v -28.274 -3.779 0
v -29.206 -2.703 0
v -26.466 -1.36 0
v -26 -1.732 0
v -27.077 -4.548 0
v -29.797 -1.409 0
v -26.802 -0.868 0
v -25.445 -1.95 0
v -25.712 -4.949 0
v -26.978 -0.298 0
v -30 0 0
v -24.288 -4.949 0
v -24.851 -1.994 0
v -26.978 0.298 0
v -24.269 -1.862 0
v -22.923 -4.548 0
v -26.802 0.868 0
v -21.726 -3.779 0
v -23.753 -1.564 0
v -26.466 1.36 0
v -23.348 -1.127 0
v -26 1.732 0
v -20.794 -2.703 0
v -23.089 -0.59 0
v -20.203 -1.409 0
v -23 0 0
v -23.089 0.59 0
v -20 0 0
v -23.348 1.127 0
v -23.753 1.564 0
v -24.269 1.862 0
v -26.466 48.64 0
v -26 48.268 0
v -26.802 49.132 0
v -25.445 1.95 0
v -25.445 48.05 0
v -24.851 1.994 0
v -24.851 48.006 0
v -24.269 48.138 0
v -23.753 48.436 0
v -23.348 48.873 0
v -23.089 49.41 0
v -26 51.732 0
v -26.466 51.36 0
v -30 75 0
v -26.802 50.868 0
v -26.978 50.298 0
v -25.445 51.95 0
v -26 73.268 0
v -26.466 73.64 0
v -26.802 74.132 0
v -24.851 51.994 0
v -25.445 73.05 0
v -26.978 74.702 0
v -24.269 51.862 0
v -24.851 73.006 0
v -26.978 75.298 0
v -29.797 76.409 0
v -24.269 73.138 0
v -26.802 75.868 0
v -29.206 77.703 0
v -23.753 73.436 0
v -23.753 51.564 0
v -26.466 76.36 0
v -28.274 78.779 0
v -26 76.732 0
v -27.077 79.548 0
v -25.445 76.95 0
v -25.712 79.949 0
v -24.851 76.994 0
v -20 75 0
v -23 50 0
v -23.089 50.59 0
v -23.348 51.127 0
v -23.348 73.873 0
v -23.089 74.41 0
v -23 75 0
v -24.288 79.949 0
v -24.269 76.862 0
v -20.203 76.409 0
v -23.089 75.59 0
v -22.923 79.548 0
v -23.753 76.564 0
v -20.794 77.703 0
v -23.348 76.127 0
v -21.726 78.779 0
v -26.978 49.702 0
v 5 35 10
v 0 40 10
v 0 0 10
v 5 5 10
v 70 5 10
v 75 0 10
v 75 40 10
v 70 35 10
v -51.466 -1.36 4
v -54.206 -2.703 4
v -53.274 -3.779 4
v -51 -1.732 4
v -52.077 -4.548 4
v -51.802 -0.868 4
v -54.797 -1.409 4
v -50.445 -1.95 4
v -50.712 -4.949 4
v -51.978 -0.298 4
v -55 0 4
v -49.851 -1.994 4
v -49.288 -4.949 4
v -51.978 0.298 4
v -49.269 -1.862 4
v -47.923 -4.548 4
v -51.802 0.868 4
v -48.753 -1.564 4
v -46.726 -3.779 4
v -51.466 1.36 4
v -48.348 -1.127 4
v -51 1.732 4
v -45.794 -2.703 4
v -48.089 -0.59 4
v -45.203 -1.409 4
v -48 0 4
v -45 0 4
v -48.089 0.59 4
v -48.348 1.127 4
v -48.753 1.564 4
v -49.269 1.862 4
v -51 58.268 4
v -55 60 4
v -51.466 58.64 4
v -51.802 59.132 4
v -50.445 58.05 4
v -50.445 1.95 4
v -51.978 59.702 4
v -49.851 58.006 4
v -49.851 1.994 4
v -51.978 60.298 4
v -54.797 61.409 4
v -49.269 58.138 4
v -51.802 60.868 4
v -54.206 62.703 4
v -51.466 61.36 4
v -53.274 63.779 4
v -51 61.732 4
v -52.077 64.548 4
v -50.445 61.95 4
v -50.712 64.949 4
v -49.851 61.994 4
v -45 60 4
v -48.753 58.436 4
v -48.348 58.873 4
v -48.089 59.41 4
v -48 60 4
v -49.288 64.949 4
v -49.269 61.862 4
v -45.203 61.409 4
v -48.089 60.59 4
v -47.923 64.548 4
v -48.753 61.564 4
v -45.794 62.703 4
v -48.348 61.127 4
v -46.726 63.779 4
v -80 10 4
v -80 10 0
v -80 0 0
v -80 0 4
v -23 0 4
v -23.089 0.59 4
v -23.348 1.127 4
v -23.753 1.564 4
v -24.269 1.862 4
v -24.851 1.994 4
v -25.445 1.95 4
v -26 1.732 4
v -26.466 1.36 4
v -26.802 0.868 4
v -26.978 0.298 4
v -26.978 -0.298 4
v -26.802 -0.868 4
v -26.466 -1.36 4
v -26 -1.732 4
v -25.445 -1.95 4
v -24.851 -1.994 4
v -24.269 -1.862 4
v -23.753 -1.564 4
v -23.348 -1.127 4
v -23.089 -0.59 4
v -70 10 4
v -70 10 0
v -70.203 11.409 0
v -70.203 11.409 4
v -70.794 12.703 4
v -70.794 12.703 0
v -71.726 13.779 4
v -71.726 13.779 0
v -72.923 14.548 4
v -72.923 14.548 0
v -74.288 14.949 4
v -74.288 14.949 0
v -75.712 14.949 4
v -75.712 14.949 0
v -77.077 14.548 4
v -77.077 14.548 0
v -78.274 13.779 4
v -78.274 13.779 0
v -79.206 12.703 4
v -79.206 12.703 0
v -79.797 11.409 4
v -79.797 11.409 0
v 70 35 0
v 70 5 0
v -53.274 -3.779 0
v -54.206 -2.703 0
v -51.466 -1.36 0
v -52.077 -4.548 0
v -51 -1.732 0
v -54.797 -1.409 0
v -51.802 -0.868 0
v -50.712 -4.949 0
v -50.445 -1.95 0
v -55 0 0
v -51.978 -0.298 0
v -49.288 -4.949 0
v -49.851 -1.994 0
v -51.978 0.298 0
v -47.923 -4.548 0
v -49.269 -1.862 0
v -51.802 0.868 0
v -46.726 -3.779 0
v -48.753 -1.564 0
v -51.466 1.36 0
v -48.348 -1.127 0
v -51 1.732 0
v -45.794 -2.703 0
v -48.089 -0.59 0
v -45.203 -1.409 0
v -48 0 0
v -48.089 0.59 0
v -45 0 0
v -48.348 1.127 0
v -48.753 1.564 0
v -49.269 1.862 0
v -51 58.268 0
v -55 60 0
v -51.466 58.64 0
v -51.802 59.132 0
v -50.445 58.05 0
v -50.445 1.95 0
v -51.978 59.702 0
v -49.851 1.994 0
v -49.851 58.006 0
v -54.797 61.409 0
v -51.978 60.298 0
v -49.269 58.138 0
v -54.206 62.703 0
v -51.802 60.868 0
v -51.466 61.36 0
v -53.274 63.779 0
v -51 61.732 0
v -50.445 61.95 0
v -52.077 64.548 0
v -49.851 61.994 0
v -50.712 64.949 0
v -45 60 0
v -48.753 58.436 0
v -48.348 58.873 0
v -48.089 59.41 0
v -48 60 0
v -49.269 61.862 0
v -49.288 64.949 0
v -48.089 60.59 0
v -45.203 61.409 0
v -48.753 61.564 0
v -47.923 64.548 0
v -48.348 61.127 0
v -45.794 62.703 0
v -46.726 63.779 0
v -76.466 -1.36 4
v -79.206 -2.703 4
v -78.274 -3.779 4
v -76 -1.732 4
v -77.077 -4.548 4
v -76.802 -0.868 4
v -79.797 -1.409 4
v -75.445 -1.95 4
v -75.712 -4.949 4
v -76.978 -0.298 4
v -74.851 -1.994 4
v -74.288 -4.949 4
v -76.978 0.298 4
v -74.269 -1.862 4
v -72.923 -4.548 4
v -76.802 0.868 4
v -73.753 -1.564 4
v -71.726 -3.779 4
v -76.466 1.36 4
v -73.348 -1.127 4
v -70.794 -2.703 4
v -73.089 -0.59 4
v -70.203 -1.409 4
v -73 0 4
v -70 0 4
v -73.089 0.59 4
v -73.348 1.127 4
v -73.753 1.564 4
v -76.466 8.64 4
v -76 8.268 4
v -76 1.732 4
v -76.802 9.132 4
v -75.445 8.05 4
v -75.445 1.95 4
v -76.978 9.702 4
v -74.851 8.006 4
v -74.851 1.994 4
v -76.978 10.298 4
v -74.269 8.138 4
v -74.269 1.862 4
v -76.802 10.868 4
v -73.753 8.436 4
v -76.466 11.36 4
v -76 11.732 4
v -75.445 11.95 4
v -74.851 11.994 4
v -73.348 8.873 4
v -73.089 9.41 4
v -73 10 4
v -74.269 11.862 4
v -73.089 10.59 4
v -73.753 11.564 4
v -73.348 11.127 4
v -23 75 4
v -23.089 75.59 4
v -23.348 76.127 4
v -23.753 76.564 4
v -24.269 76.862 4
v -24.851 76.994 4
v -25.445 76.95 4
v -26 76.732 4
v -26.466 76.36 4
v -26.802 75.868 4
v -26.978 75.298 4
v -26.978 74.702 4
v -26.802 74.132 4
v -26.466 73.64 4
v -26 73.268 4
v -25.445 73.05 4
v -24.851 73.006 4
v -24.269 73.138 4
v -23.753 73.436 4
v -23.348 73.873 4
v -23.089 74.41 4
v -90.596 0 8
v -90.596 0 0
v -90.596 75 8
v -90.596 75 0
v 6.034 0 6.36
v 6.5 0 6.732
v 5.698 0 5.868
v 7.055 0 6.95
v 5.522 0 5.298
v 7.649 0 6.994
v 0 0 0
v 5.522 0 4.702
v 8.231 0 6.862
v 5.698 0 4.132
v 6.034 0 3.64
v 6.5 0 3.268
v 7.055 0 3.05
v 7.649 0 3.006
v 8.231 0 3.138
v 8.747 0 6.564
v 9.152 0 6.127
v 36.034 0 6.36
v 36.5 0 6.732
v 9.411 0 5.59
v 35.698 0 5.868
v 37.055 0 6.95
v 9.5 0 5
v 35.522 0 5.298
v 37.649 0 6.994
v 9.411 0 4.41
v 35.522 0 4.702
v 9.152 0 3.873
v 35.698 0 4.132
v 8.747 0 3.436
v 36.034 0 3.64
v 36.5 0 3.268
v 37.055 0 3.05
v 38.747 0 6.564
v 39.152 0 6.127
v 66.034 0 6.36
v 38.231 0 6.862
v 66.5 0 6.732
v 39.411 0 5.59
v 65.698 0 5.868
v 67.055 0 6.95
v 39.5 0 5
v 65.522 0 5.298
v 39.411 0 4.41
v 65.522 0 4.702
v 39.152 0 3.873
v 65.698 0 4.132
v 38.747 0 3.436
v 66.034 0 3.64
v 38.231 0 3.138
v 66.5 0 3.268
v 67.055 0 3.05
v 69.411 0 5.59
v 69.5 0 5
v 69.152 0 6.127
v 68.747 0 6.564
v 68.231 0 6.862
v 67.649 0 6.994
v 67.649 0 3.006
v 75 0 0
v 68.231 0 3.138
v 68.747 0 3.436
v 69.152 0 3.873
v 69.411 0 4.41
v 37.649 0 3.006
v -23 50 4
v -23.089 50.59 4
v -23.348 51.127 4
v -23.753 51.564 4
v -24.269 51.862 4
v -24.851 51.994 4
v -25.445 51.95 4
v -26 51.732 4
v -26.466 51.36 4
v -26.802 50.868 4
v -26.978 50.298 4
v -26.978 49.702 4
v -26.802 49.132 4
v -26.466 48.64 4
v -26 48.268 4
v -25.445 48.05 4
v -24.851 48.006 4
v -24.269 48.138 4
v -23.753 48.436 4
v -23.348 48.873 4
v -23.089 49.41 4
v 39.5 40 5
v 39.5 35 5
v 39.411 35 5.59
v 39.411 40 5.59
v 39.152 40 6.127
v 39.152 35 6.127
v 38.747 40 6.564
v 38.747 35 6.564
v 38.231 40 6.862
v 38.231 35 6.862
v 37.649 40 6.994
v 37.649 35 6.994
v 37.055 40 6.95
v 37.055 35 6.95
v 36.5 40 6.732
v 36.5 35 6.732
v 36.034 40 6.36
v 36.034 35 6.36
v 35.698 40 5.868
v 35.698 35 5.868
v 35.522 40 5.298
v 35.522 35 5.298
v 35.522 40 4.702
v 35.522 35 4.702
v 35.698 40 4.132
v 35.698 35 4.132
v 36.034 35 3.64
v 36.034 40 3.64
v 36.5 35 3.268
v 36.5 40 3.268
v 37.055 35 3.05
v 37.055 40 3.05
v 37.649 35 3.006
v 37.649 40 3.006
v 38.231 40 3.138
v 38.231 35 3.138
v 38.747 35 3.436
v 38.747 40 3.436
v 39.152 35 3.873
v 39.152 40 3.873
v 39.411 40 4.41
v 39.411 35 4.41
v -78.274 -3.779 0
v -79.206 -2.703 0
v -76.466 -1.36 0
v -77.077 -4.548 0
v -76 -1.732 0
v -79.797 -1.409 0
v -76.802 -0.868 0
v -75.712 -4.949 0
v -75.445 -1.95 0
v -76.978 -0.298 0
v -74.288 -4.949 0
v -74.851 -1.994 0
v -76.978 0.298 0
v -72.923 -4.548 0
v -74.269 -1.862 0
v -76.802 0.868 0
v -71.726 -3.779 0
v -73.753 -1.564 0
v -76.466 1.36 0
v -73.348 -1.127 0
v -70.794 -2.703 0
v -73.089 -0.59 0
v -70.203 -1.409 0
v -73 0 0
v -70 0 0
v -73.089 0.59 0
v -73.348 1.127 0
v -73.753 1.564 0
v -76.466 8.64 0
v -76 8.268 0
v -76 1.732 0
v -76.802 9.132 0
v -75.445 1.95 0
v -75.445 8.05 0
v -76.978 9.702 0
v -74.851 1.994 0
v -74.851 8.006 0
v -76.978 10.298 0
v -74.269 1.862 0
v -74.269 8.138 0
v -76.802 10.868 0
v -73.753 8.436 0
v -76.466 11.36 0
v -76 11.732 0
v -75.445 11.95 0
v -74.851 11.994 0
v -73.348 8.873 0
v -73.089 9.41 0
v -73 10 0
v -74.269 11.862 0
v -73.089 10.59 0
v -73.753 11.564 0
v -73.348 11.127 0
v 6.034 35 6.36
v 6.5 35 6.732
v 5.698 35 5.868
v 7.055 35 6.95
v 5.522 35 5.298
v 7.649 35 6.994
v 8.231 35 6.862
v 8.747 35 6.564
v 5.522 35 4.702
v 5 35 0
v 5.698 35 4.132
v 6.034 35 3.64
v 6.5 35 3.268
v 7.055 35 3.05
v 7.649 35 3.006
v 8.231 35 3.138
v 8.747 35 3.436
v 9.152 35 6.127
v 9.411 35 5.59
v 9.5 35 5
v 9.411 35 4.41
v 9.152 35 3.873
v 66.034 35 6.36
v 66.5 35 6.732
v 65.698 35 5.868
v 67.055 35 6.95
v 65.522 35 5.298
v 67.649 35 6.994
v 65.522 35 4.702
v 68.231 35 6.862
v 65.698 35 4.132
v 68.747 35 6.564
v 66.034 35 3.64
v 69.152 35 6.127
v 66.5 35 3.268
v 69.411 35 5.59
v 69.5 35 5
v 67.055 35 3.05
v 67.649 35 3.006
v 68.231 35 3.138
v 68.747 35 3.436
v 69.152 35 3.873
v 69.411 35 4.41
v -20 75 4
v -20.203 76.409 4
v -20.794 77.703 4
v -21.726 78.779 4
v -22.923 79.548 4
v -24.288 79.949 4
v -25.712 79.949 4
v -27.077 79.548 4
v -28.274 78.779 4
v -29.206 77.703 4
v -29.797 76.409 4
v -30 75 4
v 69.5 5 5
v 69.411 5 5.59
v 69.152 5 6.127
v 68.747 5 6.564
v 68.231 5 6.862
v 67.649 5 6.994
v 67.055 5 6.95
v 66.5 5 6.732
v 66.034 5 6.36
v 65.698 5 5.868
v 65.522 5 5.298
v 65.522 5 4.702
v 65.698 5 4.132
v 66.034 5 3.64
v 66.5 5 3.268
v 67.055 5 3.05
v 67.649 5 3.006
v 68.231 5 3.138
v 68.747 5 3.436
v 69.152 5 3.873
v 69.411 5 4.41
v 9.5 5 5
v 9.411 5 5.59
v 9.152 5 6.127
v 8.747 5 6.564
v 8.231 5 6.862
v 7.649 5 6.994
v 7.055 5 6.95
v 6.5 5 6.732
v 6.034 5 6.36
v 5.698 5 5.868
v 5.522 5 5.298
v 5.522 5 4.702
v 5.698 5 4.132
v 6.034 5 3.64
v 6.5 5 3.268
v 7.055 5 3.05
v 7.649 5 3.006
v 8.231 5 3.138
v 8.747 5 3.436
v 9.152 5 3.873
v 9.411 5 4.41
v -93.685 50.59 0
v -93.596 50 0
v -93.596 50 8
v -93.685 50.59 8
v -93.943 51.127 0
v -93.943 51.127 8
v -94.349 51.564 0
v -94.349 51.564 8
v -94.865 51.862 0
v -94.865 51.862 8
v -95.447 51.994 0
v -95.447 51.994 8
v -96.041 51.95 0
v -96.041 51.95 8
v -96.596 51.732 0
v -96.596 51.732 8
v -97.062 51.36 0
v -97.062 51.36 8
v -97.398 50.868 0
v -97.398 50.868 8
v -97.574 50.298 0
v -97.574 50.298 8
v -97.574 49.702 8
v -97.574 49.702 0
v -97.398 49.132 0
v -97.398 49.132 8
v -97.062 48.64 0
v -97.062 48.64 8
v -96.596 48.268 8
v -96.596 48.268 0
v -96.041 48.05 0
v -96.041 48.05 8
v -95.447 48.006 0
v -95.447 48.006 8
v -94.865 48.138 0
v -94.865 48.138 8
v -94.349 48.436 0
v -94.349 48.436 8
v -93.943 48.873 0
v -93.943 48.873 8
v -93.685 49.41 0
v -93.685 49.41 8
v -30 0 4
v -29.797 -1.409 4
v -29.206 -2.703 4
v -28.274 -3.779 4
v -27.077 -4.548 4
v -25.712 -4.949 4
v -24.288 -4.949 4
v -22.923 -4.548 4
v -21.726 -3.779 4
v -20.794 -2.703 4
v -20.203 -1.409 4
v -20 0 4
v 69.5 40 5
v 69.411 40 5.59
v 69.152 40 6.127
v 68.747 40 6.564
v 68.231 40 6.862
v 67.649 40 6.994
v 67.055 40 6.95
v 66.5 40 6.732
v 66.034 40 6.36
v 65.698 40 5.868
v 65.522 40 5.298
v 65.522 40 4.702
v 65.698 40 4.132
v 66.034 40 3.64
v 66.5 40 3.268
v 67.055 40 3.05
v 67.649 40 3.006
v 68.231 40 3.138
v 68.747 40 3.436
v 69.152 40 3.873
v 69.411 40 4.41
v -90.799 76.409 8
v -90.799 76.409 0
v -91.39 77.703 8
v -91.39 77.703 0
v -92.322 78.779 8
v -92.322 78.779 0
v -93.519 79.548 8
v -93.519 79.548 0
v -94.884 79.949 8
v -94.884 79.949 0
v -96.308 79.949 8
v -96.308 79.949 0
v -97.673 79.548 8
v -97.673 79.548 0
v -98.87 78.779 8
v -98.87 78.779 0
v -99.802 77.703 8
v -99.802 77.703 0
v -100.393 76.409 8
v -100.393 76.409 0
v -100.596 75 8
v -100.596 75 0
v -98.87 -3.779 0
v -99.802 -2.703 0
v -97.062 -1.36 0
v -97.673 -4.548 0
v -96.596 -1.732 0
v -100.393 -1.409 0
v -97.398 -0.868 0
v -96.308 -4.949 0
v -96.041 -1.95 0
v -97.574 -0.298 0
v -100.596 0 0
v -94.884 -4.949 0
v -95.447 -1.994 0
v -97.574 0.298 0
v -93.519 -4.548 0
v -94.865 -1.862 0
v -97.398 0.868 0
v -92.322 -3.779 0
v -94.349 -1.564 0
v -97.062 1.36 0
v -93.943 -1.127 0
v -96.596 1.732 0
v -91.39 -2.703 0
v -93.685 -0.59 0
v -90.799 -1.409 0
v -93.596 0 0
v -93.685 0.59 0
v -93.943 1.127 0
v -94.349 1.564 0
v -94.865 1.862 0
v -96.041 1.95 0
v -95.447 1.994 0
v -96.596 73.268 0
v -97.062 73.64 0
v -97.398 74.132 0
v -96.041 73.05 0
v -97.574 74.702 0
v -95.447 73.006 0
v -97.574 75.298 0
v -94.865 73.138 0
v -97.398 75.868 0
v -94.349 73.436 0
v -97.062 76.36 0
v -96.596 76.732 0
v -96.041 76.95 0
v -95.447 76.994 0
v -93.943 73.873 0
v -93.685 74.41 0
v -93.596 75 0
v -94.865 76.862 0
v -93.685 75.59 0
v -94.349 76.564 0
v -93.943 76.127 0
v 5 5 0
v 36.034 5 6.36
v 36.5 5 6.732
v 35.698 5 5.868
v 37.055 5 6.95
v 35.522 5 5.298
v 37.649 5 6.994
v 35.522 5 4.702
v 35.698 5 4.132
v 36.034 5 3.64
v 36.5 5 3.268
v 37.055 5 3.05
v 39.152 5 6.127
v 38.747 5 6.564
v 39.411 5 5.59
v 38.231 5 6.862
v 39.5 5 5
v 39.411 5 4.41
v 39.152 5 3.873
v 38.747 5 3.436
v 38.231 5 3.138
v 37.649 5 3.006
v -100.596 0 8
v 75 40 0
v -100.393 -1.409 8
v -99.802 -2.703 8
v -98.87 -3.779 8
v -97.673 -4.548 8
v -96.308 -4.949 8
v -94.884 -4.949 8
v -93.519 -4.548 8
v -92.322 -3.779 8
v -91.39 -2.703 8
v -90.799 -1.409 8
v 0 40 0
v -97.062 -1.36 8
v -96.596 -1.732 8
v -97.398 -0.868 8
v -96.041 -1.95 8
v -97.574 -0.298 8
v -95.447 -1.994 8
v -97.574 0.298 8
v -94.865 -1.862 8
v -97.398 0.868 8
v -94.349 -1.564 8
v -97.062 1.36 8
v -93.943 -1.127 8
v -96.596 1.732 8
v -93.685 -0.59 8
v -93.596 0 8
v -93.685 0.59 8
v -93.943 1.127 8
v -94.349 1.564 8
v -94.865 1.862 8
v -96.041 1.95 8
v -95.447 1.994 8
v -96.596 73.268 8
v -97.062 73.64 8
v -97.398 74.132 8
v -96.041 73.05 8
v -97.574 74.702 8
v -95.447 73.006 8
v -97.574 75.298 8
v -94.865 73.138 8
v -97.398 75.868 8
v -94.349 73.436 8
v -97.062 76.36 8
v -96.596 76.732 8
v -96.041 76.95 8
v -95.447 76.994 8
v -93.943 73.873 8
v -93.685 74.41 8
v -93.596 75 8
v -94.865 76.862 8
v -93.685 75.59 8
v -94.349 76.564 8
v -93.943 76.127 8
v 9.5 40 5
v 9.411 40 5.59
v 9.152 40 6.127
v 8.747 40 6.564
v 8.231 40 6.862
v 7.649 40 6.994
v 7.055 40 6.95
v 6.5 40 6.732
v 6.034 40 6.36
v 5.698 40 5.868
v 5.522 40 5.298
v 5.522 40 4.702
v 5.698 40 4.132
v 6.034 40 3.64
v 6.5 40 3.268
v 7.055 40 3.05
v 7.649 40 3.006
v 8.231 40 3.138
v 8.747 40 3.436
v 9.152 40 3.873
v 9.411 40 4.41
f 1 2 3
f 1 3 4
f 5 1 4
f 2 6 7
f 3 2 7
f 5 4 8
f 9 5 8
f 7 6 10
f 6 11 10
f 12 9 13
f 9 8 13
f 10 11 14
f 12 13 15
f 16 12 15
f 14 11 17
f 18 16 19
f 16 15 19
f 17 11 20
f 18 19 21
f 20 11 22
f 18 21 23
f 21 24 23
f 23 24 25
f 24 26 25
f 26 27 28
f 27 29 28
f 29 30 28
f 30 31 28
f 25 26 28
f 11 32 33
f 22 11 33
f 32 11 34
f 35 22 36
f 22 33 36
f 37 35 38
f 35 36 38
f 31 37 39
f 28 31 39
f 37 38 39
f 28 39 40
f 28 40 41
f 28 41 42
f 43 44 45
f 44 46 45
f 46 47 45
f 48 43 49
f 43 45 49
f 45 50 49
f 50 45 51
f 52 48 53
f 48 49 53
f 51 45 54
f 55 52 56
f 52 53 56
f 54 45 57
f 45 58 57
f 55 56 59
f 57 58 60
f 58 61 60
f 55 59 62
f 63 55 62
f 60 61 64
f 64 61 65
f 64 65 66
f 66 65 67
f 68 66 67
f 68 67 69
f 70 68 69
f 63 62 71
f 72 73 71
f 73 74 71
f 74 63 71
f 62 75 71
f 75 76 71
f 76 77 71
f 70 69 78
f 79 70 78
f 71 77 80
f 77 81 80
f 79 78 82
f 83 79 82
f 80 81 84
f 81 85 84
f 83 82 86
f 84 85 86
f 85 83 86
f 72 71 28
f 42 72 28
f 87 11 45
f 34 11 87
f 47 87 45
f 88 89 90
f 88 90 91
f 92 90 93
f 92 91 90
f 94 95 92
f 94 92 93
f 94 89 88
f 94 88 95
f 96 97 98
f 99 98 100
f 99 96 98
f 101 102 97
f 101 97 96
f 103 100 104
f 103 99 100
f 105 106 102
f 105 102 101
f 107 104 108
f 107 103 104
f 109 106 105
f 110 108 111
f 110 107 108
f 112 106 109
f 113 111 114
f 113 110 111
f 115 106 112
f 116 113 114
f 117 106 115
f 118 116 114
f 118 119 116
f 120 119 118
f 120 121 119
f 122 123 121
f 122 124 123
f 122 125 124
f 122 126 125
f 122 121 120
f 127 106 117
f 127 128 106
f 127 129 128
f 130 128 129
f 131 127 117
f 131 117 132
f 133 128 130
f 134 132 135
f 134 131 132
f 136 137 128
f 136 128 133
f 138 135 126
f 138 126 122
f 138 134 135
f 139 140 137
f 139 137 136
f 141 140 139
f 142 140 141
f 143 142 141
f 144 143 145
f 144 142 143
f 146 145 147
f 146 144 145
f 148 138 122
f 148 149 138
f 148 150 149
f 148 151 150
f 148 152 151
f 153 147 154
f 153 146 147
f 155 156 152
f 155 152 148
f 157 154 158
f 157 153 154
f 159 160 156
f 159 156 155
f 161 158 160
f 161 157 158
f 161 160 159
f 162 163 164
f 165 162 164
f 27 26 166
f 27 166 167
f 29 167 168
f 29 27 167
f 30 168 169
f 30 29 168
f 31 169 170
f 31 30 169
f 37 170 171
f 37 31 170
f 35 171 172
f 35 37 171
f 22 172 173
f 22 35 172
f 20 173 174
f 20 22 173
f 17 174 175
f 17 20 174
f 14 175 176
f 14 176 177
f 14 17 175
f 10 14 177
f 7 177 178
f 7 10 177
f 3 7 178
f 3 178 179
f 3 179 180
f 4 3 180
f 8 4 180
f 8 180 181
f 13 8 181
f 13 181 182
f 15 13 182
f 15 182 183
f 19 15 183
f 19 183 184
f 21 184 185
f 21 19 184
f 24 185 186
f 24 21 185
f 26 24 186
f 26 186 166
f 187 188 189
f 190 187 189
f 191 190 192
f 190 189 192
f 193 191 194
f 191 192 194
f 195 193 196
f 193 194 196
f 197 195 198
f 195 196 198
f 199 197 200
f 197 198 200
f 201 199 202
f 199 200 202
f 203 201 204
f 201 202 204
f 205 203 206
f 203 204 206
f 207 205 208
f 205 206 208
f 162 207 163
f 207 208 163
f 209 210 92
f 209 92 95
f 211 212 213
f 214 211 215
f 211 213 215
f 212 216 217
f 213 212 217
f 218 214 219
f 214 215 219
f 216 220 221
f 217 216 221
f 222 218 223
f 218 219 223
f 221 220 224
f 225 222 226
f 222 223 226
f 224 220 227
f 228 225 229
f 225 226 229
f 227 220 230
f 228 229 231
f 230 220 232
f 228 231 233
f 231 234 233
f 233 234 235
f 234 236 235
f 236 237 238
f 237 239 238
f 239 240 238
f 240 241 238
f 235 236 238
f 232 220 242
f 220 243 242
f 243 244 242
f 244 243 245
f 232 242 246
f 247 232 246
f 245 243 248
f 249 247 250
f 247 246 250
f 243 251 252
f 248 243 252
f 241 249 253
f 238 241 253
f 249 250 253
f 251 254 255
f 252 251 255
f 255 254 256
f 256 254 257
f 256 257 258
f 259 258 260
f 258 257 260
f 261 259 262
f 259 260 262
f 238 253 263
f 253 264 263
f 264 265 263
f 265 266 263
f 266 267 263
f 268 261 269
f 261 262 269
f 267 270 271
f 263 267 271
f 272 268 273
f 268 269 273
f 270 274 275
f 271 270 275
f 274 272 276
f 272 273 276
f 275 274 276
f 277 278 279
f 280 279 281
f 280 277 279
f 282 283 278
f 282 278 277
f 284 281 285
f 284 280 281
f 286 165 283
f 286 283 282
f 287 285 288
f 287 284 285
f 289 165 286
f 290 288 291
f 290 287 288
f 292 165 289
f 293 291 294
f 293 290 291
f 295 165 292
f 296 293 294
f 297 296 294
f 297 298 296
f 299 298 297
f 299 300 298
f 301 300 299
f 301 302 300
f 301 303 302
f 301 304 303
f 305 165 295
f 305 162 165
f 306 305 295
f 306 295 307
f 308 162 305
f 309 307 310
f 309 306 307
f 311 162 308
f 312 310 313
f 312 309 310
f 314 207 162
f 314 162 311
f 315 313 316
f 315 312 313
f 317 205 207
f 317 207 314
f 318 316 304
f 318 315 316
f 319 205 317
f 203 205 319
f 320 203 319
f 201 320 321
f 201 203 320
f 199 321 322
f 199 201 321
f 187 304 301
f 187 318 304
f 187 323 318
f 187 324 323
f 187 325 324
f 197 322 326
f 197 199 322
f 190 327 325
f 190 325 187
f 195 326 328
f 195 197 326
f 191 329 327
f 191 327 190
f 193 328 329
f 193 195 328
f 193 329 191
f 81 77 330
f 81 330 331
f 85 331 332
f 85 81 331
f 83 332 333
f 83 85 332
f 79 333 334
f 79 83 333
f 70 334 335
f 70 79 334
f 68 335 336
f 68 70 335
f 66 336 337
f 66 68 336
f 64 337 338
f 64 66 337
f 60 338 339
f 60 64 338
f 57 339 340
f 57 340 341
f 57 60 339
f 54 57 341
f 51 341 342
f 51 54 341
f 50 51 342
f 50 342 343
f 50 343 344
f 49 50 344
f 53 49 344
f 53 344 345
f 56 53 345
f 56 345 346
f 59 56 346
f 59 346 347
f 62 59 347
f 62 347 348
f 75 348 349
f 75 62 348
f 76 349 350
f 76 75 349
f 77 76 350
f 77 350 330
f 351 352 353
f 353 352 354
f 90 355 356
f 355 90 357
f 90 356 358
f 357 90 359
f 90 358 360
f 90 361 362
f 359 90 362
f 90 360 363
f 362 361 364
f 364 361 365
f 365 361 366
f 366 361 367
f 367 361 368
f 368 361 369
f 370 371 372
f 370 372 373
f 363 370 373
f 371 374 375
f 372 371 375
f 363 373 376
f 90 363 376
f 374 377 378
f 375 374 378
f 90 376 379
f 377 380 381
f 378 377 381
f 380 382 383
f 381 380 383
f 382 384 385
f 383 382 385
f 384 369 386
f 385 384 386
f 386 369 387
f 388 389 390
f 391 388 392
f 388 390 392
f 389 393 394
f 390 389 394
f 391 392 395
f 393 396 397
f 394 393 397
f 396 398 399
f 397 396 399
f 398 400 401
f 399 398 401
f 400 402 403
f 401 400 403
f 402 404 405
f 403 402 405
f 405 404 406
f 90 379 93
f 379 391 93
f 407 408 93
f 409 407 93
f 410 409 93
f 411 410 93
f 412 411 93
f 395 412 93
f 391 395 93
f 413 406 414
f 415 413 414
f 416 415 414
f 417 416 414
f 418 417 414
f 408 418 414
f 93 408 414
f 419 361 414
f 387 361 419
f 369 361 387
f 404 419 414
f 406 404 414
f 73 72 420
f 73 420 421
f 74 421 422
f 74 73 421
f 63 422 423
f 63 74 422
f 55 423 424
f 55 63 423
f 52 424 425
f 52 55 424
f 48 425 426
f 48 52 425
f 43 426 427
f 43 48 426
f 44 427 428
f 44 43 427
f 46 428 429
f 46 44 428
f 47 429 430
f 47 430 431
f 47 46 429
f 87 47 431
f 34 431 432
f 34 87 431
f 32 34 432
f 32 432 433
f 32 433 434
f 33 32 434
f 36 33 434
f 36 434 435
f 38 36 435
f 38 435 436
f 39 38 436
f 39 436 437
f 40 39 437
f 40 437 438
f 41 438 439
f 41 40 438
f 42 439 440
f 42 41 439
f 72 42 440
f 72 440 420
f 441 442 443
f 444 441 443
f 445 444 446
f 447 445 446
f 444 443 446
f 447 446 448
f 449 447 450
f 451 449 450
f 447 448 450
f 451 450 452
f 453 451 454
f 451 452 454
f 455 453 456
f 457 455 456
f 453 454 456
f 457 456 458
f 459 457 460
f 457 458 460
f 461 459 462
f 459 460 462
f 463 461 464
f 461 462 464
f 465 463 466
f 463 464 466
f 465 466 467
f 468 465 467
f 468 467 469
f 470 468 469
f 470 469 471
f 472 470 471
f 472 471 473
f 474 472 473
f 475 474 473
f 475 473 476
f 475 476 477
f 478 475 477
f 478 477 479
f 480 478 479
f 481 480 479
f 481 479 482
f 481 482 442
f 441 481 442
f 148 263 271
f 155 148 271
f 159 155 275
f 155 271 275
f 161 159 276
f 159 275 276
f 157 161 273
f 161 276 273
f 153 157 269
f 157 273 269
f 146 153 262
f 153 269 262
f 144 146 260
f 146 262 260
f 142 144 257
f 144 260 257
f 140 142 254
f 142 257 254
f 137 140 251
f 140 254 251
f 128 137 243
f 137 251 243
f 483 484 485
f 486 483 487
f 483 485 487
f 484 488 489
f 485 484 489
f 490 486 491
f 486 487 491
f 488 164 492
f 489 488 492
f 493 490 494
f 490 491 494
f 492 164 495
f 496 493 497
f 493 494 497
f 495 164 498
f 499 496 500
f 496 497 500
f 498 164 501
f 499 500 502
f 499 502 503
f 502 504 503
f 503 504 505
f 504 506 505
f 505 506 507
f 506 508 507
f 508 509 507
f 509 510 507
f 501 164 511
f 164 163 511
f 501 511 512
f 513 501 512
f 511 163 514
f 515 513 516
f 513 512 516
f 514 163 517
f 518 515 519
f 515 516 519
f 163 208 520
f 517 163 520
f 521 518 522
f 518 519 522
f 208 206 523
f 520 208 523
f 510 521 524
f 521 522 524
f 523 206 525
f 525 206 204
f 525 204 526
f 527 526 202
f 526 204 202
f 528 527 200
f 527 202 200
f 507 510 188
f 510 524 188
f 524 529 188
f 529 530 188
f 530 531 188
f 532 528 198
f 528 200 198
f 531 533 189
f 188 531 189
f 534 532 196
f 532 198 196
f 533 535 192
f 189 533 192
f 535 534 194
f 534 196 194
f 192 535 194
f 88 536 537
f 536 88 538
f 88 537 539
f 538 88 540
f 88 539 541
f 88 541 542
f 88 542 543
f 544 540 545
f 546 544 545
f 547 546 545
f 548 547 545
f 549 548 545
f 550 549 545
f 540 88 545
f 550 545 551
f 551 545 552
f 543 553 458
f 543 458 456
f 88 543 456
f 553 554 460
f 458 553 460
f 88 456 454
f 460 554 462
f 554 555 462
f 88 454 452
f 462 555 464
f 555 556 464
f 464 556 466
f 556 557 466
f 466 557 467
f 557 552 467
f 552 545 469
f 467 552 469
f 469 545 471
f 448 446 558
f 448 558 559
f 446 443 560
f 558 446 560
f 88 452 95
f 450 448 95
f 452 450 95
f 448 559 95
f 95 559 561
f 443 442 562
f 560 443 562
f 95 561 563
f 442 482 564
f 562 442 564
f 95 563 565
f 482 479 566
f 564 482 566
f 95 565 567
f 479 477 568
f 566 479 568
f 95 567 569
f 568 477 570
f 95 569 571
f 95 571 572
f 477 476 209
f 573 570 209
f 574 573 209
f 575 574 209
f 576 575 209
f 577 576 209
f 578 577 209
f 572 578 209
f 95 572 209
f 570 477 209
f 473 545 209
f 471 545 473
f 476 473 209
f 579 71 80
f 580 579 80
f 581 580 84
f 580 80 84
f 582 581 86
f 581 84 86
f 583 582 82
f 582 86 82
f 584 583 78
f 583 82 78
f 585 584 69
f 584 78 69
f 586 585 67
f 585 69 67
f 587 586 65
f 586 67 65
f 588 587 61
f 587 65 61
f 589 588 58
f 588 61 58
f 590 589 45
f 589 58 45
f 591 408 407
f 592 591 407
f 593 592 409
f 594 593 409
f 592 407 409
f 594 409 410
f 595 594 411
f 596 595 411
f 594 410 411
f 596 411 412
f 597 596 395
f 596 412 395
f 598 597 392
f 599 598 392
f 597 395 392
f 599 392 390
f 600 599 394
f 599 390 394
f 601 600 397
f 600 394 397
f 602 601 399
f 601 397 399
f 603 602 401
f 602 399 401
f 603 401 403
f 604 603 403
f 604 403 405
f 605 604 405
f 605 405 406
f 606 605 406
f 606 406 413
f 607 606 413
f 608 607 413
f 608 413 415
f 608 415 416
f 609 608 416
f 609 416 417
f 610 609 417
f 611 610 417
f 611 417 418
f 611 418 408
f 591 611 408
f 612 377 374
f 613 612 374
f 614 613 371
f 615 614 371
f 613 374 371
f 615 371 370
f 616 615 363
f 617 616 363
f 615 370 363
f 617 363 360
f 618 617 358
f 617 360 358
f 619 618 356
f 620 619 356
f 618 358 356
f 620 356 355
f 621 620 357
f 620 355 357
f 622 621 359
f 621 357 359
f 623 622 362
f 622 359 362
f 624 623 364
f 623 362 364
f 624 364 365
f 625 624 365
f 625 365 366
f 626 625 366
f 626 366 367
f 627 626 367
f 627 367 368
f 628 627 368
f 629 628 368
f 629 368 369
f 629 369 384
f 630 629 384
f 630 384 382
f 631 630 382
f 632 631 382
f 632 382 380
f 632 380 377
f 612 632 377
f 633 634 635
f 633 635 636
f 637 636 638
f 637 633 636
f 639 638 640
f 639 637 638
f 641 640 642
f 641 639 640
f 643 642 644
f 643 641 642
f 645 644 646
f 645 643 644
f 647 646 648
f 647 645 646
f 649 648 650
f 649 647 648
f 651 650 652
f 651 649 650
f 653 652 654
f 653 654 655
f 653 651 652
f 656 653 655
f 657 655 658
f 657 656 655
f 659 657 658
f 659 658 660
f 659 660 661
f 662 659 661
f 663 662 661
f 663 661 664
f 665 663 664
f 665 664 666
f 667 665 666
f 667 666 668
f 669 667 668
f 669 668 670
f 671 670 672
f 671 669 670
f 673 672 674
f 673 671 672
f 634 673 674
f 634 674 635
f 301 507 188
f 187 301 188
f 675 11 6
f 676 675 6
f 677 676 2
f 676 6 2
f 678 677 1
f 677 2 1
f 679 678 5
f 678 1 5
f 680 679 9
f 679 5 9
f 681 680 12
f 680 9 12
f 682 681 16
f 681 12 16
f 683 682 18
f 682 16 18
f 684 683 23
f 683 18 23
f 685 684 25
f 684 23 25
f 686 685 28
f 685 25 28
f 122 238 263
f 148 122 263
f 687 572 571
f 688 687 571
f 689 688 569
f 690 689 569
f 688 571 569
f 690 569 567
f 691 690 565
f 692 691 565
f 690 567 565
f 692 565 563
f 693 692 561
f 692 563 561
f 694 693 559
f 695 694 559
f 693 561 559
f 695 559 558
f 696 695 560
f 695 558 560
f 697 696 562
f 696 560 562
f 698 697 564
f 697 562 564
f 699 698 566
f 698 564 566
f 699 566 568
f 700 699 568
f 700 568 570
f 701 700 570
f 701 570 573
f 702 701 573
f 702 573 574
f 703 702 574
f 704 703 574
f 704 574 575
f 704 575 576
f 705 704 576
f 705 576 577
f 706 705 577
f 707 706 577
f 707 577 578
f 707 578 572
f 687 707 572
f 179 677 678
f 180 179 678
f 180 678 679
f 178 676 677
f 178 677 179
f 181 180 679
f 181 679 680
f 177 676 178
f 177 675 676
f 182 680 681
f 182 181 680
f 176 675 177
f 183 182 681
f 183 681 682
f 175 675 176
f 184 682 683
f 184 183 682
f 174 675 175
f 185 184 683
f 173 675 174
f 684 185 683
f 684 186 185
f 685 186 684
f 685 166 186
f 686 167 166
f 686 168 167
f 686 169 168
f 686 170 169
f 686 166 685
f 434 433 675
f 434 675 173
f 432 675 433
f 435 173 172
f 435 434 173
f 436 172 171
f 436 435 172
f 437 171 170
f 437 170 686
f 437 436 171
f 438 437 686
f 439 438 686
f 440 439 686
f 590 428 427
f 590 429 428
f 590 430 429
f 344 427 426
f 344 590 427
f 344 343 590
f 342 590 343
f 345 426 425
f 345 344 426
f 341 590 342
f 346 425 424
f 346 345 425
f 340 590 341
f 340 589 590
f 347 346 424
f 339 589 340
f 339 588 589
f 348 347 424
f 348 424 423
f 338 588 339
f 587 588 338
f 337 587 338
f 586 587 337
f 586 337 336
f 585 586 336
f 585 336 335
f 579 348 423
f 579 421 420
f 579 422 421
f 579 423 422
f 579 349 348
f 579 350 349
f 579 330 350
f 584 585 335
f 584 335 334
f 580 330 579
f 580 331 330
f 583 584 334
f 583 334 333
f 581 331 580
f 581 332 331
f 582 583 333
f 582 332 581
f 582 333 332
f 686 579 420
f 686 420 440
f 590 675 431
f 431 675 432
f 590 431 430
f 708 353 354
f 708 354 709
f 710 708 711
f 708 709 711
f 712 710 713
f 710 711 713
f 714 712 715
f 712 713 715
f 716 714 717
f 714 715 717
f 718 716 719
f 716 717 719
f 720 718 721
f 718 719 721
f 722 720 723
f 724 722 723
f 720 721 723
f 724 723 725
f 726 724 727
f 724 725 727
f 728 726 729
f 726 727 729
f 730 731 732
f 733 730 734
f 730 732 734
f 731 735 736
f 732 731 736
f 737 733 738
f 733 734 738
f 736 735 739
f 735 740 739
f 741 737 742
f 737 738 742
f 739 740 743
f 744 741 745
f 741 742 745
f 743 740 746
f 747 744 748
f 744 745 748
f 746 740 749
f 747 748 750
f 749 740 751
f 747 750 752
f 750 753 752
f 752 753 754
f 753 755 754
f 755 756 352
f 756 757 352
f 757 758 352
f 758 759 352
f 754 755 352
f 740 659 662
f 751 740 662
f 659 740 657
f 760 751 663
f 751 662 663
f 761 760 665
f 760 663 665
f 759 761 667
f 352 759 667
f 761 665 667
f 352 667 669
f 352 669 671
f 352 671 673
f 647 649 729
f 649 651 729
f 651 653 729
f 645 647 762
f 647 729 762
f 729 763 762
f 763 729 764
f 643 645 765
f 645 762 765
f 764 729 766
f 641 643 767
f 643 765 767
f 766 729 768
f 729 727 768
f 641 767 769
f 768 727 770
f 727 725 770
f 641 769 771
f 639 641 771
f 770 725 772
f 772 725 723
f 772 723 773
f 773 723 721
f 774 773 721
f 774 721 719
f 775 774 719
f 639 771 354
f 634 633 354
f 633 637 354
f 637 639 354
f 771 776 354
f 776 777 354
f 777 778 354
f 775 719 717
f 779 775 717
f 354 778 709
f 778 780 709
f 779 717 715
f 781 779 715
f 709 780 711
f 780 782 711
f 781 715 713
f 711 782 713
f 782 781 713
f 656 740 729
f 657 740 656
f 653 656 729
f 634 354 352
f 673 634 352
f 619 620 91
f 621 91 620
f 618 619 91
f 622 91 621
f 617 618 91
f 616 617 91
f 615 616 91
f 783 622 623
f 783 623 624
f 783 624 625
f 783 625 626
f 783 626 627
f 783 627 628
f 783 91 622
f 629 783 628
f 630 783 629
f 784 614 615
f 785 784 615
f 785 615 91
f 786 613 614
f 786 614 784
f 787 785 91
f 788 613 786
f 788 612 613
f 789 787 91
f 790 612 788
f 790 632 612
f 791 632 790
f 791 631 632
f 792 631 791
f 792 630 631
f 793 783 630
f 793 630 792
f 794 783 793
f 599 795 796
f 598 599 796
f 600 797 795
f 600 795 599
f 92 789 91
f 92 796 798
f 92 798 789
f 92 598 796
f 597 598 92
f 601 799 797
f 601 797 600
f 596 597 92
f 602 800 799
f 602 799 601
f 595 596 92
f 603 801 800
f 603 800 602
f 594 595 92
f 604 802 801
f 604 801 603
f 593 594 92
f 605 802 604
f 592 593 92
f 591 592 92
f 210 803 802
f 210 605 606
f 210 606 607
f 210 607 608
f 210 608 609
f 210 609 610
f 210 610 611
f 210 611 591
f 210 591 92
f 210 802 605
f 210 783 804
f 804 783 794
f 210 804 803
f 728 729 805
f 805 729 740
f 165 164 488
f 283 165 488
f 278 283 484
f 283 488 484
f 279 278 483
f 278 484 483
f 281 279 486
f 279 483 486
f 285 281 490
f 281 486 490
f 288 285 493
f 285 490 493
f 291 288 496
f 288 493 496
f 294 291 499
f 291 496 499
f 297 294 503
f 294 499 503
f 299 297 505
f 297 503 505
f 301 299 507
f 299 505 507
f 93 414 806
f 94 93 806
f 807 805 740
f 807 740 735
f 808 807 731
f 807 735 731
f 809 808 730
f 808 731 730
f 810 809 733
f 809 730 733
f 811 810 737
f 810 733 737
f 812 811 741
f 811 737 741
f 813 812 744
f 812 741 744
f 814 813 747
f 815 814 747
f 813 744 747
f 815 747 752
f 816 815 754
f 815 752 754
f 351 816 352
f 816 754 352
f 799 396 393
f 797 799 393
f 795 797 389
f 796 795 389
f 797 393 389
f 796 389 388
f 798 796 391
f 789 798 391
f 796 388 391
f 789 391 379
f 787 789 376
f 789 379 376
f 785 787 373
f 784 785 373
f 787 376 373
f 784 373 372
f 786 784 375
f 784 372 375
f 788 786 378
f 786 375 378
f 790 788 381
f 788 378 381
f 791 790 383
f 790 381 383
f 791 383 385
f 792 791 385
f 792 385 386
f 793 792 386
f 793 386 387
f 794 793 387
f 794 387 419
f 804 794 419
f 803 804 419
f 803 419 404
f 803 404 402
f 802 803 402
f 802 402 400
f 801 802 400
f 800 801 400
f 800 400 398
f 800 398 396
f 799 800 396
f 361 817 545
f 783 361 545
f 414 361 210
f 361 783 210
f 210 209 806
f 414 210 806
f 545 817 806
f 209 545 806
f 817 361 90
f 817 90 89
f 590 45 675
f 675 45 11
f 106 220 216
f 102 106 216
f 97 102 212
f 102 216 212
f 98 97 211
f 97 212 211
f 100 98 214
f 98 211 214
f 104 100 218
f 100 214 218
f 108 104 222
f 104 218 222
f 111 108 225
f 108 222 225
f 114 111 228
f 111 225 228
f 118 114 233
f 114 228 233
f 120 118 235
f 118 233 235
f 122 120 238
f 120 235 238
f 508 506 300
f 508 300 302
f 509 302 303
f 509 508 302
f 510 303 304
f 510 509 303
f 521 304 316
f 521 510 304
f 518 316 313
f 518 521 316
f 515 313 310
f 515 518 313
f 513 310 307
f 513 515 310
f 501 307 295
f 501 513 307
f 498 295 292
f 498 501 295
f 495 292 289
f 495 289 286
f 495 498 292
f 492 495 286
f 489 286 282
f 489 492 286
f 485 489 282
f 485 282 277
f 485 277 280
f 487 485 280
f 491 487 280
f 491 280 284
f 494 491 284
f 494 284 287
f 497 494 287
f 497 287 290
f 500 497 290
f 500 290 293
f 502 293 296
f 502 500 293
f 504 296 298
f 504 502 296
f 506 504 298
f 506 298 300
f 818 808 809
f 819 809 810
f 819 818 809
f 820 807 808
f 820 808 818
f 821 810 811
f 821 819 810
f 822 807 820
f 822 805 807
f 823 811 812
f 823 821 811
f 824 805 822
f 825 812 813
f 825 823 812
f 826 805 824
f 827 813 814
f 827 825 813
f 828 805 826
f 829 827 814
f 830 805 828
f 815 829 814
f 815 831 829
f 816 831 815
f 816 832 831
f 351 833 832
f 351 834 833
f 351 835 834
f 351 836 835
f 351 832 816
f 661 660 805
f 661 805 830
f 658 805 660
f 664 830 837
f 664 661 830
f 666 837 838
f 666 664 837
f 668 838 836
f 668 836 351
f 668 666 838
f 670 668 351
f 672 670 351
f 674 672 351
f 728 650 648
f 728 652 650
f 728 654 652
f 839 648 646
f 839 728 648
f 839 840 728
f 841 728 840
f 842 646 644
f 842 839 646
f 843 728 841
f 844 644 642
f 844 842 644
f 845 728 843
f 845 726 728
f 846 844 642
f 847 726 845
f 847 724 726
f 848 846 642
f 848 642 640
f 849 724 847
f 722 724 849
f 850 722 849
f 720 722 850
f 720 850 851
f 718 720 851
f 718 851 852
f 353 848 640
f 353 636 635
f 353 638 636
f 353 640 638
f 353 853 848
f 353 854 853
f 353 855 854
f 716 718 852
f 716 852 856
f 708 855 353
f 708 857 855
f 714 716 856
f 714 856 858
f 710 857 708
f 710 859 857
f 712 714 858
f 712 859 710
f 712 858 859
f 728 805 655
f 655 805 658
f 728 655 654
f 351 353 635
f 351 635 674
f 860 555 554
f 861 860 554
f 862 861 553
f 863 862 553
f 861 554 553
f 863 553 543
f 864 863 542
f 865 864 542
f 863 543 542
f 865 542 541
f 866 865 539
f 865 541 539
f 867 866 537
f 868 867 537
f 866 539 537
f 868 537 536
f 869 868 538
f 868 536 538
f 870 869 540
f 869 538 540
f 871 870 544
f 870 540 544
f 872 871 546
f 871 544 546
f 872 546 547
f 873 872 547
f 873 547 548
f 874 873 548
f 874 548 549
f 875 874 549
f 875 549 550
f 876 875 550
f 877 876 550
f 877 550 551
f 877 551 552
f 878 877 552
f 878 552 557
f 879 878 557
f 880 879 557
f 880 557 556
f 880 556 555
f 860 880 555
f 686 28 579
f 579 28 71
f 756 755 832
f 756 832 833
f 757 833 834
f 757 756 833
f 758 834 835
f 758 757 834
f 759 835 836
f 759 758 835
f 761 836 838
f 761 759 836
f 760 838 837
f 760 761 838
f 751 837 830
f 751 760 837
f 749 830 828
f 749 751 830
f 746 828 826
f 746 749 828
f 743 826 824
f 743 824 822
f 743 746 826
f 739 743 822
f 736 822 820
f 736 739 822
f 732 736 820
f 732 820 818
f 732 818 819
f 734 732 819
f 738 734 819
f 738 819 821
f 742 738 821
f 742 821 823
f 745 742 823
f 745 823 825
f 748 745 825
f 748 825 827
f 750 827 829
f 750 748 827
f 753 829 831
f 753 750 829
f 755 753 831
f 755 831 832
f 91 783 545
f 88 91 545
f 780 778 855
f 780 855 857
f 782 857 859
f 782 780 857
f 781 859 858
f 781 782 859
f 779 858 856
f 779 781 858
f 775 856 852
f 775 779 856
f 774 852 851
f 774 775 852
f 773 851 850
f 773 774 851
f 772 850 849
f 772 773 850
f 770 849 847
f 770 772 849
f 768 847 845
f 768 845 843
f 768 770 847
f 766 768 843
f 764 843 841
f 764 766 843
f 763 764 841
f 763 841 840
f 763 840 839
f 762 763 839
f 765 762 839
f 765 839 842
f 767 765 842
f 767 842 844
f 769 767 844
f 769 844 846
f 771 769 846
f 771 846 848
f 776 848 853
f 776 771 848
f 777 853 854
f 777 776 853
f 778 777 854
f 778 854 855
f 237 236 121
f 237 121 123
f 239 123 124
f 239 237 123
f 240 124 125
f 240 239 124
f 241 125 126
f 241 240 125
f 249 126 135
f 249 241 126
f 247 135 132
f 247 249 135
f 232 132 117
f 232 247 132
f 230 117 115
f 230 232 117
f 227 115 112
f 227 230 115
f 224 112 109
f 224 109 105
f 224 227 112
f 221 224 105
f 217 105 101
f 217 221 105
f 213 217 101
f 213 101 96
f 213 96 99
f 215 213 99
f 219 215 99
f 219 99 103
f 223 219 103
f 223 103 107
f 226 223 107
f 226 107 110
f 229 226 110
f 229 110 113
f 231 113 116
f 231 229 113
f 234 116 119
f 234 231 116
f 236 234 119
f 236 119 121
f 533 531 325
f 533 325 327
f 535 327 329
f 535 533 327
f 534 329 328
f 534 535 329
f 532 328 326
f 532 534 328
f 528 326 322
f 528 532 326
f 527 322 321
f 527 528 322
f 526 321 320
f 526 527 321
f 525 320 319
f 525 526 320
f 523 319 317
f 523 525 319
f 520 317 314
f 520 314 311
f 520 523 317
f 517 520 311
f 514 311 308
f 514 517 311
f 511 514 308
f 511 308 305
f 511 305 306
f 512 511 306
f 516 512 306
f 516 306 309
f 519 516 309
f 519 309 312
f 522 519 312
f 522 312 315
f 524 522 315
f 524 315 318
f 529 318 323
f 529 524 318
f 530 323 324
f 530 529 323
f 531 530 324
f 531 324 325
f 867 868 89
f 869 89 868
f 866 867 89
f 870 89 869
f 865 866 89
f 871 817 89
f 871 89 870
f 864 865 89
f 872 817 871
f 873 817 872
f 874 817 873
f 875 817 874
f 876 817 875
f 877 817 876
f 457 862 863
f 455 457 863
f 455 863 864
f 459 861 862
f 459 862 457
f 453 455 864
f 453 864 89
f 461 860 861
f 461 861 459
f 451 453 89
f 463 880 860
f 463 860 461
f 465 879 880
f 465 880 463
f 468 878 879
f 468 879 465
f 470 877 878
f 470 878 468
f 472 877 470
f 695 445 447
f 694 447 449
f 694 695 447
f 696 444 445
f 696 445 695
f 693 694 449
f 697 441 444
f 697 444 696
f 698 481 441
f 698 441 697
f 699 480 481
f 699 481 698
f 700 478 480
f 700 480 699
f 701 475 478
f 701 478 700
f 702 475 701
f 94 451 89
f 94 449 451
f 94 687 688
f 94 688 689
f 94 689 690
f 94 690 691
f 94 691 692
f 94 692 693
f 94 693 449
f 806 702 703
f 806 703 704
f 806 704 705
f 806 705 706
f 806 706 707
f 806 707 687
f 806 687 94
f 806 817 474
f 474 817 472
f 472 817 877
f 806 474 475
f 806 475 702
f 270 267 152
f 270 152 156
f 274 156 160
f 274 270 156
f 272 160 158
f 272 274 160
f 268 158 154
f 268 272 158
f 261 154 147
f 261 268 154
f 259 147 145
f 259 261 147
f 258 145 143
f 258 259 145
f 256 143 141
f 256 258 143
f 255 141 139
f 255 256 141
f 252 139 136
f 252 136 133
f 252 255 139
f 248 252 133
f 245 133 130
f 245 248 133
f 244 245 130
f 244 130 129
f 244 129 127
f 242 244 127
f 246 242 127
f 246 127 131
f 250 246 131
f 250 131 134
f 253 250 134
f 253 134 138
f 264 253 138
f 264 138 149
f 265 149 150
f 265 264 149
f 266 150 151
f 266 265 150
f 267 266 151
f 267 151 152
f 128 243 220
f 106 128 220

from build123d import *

# Parameters (mm, degrees)
F0_W     = 75
F0_H     = 40
F0_W_2   = 65
F0_H_2   = 30
F1_DEPTH = 10
F2_R     = 2
F3_DEPTH = 40.001
F4_R     = 2
F5_DEPTH = 4
F6_R     = 2
F7_DEPTH = 8


with BuildPart() as f1:
    # F0 (on Top) → F1 (new body)
    with BuildSketch(Plane.XY):
        with Locations((37.5, 20)):
            Rectangle(F0_W, F0_H)
        with Locations((37.5, 20)):
            Rectangle(F0_W_2, F0_H_2, mode=Mode.SUBTRACT)
    extrude(amount=F1_DEPTH)

    # F2 (on Front) → F3 (cut, through all)
    with BuildSketch(Plane.XZ):
        with Locations((7.5, 5)):
            Circle(F2_R)
        with Locations((37.5, 5)):
            Circle(F2_R)
        with Locations((67.5, 5)):
            Circle(F2_R)
    extrude(amount=-F3_DEPTH, mode=Mode.SUBTRACT)


with BuildPart() as f5:
    # F4 (on Top) → F5 (new body)
    with BuildSketch(Plane.XY):
        with BuildLine():
            Line((-70, 0), (-70, 10))
            ThreePointArc((-70, 10), (-75, 15), (-80, 10))
            Line((-80, 10), (-80, 0))
            ThreePointArc((-80, 0), (-75, -5), (-70, 0))
        make_face()
        with Locations((-75, 0)):
            Circle(F4_R, mode=Mode.SUBTRACT)
        with Locations((-75, 10)):
            Circle(F4_R, mode=Mode.SUBTRACT)
        with BuildLine():
            Line((-45, 0), (-45, 60))
            ThreePointArc((-45, 60), (-50, 65), (-55, 60))
            Line((-55, 60), (-55, 0))
            ThreePointArc((-55, 0), (-50, -5), (-45, 0))
        make_face()
        with Locations((-50, 0)):
            Circle(F4_R, mode=Mode.SUBTRACT)
        with Locations((-50, 60)):
            Circle(F4_R, mode=Mode.SUBTRACT)
        with BuildLine():
            Line((-20, 0), (-20, 75))
            ThreePointArc((-20, 75), (-25, 80), (-30, 75))
            Line((-30, 75), (-30, 0))
            ThreePointArc((-30, 0), (-25, -5), (-20, 0))
        make_face()
        with Locations((-25, 0)):
            Circle(F4_R, mode=Mode.SUBTRACT)
        with Locations((-25, 50)):
            Circle(F4_R, mode=Mode.SUBTRACT)
        with Locations((-25, 75)):
            Circle(F4_R, mode=Mode.SUBTRACT)
    extrude(amount=F5_DEPTH)


with BuildPart() as f7:
    # F6 (on Top) → F7 (new body)
    with BuildSketch(Plane.XY):
        with BuildLine():
            Line((-100.595971, 75), (-100.595971, 0))
            ThreePointArc((-100.595971, 0), (-95.595971, -5), (-90.595971, 0))
            Line((-90.595971, 0), (-90.595971, 75))
            ThreePointArc((-90.595971, 75), (-95.595971, 80), (-100.595971, 75))
        make_face()
        with Locations((-95.595971, 0)):
            Circle(F6_R, mode=Mode.SUBTRACT)
        with Locations((-95.595971, 50)):
            Circle(F6_R, mode=Mode.SUBTRACT)
        with Locations((-95.595971, 75)):
            Circle(F6_R, mode=Mode.SUBTRACT)
    extrude(amount=F7_DEPTH)


solid = Compound([f1.part, f5.part, f7.part])
